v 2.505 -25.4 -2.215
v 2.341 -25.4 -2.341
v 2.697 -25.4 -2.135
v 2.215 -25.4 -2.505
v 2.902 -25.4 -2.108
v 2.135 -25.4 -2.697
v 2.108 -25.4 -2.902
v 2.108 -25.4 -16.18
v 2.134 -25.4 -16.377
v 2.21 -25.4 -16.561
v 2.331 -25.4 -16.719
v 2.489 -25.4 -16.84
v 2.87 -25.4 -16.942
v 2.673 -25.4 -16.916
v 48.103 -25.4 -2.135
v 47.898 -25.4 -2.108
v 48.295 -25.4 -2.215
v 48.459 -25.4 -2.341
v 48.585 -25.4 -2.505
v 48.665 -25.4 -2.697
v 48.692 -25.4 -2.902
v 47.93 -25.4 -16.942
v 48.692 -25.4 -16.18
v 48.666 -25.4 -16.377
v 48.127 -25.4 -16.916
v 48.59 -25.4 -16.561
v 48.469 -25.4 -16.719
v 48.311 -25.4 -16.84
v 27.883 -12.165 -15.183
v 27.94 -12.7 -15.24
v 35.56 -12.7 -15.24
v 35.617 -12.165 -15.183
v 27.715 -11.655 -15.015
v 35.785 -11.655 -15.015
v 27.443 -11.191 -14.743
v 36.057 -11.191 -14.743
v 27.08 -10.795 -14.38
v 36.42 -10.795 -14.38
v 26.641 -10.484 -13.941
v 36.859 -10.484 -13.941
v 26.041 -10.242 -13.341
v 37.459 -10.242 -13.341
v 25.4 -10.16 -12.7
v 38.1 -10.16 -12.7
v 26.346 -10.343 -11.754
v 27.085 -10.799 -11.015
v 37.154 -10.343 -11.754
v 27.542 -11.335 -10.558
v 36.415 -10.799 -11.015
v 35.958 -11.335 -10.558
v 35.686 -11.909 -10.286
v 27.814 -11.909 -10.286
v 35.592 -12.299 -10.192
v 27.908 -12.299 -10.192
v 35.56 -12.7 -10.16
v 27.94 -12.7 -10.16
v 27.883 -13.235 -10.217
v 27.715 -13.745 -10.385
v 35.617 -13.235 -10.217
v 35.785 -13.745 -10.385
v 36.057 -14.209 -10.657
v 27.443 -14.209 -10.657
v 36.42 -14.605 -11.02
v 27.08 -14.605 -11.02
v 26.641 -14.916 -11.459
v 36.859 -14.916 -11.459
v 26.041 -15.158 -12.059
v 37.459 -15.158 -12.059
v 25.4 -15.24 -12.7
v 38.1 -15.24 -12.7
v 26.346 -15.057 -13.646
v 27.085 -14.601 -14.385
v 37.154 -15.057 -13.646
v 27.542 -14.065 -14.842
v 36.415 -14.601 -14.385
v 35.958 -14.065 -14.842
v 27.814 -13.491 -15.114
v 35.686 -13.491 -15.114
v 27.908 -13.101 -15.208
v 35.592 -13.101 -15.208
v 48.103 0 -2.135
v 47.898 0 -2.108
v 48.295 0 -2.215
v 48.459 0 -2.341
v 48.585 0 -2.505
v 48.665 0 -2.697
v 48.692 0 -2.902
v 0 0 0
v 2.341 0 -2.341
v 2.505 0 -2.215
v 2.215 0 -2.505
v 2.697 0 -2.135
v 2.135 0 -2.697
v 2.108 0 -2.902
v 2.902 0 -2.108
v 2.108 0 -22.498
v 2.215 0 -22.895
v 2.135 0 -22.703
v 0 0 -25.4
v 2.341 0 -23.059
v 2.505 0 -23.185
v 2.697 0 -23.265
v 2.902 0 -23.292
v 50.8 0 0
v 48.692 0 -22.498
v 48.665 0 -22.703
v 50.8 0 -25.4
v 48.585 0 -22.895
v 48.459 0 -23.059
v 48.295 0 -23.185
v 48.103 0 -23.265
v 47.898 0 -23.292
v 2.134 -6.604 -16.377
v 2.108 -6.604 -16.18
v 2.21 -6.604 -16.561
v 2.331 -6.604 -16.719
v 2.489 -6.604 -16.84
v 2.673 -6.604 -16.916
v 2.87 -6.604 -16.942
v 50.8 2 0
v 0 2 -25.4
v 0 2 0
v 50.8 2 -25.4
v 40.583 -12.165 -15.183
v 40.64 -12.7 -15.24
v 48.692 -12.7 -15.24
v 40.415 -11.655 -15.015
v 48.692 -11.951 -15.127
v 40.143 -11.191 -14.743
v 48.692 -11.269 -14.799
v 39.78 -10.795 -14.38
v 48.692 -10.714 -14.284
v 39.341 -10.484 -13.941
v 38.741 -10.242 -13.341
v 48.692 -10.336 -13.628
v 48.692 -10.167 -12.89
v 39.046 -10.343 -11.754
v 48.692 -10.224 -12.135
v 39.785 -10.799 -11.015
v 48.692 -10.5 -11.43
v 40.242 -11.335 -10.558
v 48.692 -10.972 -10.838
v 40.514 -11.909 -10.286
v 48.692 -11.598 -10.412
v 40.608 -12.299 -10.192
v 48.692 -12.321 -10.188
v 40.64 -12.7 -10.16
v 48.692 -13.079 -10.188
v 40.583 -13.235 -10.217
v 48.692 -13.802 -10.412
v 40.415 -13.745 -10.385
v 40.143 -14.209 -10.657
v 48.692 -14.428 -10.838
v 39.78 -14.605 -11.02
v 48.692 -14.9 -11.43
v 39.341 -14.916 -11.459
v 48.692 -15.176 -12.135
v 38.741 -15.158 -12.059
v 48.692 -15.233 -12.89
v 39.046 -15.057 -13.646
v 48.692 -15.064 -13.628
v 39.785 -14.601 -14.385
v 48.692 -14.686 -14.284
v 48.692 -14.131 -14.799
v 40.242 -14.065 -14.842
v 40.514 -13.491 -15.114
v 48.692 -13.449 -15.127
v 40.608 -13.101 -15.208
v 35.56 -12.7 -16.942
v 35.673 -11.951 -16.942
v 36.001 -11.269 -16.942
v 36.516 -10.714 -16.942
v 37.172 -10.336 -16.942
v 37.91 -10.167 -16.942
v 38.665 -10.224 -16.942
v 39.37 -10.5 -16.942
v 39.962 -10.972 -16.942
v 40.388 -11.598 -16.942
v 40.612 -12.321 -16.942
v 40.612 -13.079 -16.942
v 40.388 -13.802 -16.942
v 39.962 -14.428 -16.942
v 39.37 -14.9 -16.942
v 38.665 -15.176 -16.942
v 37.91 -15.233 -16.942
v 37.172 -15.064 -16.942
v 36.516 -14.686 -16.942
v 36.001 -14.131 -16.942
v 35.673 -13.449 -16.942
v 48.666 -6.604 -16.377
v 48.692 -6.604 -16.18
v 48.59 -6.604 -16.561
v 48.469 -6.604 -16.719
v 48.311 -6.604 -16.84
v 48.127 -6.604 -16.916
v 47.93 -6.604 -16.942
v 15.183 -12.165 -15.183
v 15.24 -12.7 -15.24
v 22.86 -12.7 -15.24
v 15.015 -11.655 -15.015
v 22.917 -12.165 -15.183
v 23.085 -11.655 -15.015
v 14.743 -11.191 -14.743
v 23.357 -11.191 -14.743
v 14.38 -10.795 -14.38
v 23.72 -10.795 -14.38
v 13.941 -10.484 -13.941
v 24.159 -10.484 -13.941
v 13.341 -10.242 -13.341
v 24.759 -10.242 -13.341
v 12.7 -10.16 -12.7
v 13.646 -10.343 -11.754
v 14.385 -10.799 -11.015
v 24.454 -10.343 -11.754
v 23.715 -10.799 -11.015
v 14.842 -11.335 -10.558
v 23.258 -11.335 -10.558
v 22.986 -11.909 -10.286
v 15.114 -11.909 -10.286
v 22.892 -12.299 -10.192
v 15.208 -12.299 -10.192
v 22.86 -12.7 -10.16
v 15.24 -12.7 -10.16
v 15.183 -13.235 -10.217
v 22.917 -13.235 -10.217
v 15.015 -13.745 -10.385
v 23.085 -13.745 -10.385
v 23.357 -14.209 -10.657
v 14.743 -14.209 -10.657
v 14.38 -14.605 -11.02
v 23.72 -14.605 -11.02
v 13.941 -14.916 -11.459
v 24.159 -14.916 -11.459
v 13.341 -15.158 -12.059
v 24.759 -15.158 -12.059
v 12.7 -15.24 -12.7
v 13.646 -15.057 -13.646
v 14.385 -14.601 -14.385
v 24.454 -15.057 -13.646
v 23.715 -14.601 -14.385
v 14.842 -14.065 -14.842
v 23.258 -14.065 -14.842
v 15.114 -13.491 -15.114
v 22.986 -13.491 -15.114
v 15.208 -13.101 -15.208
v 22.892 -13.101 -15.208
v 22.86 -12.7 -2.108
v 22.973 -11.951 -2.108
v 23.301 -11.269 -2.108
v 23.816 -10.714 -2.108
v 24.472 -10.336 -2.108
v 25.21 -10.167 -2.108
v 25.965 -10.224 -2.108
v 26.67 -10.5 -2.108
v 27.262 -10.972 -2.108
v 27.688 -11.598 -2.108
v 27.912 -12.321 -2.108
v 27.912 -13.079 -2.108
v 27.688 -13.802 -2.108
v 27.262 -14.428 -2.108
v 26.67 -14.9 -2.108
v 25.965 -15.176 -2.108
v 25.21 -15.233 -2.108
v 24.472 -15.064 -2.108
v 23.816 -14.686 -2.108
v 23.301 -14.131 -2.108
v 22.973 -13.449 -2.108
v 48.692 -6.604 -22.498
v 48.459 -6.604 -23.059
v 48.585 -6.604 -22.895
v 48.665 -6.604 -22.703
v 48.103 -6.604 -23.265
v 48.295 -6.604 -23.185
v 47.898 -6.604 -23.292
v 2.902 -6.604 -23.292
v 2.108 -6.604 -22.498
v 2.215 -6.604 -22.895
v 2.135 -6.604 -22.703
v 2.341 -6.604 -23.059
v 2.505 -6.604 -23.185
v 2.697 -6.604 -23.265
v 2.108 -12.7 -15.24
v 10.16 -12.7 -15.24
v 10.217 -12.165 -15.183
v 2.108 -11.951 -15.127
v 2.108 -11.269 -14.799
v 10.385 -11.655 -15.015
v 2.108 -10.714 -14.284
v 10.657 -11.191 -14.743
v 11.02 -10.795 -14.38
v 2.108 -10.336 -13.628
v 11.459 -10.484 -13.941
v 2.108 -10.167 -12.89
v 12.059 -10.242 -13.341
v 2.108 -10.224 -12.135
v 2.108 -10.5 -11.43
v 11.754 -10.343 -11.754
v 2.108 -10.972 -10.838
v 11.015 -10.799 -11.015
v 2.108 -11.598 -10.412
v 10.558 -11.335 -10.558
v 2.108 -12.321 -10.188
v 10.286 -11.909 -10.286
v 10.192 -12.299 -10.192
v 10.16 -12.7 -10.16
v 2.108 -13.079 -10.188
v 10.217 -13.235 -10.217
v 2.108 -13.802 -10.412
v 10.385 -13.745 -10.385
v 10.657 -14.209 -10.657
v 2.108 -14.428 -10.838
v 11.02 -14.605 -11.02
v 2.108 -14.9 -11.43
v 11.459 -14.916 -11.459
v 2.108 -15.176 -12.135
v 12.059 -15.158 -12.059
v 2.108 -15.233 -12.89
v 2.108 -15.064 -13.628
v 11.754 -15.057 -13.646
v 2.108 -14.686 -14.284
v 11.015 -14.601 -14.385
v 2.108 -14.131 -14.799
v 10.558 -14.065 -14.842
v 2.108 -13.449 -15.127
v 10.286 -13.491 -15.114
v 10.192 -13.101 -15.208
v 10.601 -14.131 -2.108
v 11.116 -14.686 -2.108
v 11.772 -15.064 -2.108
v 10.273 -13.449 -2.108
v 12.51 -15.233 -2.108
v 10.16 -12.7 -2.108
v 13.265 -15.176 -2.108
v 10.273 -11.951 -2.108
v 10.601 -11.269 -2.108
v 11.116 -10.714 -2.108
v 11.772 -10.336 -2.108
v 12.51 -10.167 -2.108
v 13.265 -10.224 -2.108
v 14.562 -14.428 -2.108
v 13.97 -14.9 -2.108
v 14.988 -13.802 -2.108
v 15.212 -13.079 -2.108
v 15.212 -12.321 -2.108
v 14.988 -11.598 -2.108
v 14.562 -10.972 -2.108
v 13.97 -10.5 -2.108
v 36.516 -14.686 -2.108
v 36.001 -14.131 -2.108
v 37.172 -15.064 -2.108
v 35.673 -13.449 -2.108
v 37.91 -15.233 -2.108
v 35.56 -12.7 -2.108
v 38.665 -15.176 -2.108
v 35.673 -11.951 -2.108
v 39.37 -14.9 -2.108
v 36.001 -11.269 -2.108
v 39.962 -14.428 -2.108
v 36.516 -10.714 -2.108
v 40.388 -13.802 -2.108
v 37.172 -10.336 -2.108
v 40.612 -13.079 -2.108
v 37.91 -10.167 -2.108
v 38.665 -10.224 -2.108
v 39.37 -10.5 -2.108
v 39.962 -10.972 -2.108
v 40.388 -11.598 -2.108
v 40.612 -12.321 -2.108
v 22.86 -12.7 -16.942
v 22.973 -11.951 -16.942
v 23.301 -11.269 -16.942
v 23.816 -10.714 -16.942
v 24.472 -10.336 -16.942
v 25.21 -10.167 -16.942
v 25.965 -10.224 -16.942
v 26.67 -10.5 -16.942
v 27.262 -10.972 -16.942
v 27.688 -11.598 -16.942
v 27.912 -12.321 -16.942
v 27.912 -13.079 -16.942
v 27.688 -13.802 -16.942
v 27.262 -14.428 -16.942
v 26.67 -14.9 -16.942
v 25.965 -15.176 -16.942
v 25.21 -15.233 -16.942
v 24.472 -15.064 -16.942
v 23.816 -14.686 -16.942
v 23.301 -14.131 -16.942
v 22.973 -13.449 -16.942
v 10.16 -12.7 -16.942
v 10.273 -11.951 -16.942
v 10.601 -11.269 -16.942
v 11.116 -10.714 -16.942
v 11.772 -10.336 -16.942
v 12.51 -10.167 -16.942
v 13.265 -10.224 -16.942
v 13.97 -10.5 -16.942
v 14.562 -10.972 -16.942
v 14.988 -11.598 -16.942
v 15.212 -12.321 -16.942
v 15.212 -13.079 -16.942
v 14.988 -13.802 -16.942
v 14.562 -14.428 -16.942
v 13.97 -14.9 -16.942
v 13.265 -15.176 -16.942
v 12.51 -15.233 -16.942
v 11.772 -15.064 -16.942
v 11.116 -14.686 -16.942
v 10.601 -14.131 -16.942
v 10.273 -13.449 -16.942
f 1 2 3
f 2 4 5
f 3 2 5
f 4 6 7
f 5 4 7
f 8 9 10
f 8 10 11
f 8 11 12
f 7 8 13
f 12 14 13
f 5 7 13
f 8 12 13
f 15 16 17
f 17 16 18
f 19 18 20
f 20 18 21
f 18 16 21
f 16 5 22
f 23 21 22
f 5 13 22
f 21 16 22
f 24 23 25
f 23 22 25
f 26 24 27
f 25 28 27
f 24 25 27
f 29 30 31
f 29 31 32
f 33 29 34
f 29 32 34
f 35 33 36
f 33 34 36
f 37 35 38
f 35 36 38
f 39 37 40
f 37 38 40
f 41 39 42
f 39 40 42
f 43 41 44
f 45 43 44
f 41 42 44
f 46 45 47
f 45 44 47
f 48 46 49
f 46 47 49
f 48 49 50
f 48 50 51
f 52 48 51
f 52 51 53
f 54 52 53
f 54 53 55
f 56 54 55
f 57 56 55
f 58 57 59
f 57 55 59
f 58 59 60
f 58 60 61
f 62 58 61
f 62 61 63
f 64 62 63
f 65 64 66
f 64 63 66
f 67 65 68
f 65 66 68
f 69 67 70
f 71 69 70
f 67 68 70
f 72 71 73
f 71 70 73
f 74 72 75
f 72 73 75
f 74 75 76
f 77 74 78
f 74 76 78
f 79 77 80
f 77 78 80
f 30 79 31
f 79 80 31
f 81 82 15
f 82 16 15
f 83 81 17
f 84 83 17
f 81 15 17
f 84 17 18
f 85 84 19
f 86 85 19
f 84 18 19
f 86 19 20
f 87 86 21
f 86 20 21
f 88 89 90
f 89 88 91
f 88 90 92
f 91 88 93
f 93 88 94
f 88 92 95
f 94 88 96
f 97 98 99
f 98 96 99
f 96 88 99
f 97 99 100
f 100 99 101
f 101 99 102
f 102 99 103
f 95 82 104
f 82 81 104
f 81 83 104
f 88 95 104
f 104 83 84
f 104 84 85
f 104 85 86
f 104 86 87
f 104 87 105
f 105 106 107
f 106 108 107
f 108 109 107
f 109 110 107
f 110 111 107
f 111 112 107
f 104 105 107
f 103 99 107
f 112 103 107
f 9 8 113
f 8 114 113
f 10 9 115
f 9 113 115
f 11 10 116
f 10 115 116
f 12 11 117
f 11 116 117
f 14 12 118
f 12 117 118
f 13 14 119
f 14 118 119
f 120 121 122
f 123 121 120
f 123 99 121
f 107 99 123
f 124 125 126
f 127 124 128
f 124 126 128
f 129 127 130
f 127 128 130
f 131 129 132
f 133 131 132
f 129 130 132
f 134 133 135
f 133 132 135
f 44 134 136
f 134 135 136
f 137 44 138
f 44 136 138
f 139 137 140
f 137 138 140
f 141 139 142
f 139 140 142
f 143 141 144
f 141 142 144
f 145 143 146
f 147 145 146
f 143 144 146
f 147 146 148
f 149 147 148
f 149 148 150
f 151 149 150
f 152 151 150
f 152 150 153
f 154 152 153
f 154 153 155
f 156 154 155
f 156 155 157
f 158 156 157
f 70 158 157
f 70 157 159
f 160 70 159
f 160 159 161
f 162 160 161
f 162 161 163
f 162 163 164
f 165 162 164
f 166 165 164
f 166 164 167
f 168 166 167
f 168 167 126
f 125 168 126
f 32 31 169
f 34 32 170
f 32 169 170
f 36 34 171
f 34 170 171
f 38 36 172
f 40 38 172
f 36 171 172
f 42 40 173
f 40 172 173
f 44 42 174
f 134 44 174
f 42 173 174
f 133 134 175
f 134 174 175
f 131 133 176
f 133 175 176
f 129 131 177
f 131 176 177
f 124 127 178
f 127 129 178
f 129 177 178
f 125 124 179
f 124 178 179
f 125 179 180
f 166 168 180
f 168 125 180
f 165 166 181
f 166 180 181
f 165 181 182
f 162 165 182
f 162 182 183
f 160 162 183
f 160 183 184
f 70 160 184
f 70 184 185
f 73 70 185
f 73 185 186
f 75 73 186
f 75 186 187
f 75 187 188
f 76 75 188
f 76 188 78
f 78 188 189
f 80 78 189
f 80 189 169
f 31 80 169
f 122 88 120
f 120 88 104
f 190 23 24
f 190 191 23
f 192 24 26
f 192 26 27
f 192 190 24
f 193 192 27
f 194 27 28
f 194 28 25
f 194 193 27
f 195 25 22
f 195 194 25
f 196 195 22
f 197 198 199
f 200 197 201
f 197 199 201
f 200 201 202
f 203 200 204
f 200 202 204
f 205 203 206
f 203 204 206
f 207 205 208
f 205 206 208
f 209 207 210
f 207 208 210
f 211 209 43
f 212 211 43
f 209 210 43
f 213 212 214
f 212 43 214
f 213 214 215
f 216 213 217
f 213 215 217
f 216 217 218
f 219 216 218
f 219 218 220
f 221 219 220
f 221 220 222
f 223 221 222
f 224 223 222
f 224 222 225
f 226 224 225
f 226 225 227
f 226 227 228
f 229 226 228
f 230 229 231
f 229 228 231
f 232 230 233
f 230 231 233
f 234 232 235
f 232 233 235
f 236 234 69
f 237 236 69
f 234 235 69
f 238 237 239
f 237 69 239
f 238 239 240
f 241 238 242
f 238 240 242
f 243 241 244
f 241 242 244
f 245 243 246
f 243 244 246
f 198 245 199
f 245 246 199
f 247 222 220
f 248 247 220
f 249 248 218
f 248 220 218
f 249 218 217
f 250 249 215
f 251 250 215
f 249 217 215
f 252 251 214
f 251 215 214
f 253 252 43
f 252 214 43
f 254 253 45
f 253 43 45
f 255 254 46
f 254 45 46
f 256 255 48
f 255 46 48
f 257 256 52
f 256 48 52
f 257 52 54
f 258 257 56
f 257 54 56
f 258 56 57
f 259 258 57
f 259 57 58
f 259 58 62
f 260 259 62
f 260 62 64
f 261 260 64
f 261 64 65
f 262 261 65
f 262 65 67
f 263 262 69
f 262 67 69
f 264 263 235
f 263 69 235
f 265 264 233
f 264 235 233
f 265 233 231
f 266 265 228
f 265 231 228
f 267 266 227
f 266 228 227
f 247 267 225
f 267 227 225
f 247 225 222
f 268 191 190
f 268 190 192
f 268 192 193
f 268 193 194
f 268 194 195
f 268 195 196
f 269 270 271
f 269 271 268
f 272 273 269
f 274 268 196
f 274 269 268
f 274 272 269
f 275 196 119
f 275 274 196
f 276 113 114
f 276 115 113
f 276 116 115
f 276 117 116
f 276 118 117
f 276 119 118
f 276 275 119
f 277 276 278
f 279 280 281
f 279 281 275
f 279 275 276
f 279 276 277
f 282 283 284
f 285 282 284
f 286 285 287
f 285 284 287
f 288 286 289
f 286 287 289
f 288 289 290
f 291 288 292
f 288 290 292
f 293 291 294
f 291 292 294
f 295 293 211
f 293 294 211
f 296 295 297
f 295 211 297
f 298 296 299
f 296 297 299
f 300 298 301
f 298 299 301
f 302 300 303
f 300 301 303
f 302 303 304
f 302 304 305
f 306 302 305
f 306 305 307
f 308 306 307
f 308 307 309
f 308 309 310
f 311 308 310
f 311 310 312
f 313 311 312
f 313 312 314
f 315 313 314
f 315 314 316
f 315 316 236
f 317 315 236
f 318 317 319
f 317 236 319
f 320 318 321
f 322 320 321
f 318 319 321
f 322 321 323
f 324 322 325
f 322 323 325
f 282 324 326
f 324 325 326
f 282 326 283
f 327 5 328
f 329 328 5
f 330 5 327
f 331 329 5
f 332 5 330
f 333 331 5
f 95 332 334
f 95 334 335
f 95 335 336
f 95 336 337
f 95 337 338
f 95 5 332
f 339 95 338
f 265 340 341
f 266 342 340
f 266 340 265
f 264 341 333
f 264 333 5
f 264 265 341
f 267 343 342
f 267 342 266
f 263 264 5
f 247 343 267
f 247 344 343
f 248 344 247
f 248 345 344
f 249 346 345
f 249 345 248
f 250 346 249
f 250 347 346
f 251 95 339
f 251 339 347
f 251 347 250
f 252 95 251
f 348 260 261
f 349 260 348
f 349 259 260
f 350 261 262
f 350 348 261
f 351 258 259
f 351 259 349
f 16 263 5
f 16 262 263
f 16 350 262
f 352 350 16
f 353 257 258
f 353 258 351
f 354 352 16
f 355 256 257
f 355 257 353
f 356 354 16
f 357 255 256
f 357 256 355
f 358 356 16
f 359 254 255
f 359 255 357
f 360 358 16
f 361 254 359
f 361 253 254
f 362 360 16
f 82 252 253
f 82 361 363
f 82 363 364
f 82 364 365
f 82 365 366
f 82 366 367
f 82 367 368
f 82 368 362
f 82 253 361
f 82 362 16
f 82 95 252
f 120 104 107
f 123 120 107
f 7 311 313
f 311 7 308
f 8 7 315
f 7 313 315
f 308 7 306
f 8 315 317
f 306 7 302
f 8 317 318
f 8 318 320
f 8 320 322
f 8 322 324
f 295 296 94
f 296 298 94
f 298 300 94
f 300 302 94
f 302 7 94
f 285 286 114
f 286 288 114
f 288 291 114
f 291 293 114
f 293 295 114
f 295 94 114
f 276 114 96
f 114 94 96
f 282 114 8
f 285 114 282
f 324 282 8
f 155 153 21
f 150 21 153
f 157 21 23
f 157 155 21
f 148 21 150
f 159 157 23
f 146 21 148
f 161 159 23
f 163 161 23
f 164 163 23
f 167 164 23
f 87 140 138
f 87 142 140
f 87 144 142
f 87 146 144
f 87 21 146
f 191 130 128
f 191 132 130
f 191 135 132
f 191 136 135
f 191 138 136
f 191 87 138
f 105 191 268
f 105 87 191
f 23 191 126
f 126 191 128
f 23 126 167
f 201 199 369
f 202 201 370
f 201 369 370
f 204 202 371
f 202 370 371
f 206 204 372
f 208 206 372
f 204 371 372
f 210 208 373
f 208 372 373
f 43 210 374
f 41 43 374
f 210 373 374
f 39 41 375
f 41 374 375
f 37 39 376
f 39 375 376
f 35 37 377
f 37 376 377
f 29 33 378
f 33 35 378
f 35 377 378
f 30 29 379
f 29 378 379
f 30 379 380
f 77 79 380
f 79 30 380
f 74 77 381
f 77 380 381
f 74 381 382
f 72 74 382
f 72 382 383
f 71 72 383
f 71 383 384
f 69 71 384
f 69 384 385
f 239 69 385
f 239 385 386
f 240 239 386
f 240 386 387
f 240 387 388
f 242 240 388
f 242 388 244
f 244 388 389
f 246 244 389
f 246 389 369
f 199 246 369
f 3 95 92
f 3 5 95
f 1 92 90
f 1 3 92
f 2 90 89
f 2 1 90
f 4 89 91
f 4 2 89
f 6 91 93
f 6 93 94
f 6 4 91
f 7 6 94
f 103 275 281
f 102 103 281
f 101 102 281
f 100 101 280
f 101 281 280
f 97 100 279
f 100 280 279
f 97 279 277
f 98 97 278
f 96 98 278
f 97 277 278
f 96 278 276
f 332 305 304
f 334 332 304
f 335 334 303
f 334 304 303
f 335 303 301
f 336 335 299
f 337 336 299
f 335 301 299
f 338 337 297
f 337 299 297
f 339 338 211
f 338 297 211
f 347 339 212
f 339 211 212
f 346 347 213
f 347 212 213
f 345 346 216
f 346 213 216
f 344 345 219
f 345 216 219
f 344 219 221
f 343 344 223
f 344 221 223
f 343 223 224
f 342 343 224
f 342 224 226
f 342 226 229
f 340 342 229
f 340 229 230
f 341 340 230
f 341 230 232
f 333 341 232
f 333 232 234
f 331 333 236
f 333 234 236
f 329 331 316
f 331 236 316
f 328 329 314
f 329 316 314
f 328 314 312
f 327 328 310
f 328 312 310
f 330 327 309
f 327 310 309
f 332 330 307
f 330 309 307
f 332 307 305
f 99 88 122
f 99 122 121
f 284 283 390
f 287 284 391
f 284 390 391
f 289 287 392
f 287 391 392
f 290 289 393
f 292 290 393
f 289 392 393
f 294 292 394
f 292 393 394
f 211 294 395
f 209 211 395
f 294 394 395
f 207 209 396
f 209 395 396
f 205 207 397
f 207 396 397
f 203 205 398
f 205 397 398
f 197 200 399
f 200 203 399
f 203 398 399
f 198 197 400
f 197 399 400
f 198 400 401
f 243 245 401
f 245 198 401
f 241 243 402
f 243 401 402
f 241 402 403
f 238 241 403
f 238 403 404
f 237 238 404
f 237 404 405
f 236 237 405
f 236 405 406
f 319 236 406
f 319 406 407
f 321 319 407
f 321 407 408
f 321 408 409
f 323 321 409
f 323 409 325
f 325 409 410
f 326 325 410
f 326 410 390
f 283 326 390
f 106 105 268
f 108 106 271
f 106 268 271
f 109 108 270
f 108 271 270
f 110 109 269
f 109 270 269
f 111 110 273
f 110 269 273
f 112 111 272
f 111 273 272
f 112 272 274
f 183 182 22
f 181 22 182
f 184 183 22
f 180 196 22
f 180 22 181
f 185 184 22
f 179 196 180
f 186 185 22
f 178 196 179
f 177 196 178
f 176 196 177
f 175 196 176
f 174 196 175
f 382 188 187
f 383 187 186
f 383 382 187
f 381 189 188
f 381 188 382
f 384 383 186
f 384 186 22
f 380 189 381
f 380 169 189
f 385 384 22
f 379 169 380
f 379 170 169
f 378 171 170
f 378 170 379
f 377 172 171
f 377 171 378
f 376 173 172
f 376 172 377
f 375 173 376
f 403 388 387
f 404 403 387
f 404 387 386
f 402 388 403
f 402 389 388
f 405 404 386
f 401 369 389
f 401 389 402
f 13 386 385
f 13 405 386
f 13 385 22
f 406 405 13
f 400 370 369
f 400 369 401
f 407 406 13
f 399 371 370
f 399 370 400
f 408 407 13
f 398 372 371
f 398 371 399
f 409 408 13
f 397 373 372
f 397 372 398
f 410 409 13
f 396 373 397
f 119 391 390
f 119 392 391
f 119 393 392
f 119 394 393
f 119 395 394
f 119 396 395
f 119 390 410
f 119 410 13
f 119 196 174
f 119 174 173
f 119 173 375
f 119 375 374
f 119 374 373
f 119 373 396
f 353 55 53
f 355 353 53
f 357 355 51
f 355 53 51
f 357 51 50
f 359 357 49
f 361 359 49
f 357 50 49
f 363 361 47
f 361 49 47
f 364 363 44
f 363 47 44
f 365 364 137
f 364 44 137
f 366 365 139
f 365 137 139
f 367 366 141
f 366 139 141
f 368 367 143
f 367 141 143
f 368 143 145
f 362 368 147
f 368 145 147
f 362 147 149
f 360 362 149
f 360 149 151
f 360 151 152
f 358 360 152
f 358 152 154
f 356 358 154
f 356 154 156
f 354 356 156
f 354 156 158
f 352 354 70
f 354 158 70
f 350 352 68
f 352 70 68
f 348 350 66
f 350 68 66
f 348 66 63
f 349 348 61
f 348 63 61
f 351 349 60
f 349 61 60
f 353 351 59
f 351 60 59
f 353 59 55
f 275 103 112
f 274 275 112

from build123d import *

# Parameters (mm, degrees)
SKETCH2_W           = 50.8
SKETCH2_H           = 25.4
BOSS_EXTRUDE2_DEPTH = 1.999996
SKETCH2_4_W         = 46.5836
SKETCH2_4_H         = 21.1836
BOSS_EXTRUDE3_DEPTH = 25.4
FILLET3_R           = 0.79375
SKETCH3_R           = 2.54
CUT_EXTRUDE1_DEPTH  = 49.6918
SKETCH4_R           = 2.54
CUT_EXTRUDE2_DEPTH  = 24.2918
SKETCH5_W           = 46.5836
SKETCH5_H           = 18.796
CUT_EXTRUDE3_DEPTH  = 6.35
FILLET4_R           = 0.762


with BuildPart() as part:
    # Sketch2 → Boss-Extrude2 (new body)
    with BuildSketch(Plane(origin=(0, 0, 0), x_dir=(1, 0, 0), z_dir=(0, 1, 0))):
        with Locations((25.4, 12.7)):
            Rectangle(SKETCH2_W, SKETCH2_H)
    extrude(amount=BOSS_EXTRUDE2_DEPTH)

    # Sketch2<4> → Boss-Extrude3 (add)
    with BuildSketch(Plane(origin=(0, 0, 0), x_dir=(1, 0, 0), z_dir=(0, 1, 0))):
        with Locations((25.4, 12.7)):
            Rectangle(SKETCH2_4_W, SKETCH2_4_H)
    extrude(amount=-BOSS_EXTRUDE3_DEPTH)

    # Fillet3
    fillet3_edges = [part.edges().sort_by_distance(p)[0] for p in [
        (2.1082, -12.7, -2.1082),
        (2.1082, -12.7, -23.2918),
        (48.6918, -12.7, -23.2918),
        (48.6918, -12.7, -2.1082),
    ]]
    fillet(fillet3_edges, radius=FILLET3_R)

    # Sketch3 → Cut-Extrude1 (cut, through all)
    with BuildSketch(Plane(origin=(48.6918, 0, 0), x_dir=(0, 0, -1), z_dir=(1, 0, 0))):
        with Locations((12.7, -12.7)):
            Circle(SKETCH3_R)
    extrude(amount=-CUT_EXTRUDE1_DEPTH, mode=Mode.SUBTRACT)

    # Sketch4 → Cut-Extrude2 (cut, through all)
    with BuildSketch(Plane(origin=(0, 0, -23.2918), x_dir=(-1, 0, 0), z_dir=(0, 0, -1))):
        with Locations((-25.4, -12.7)):
            Circle(SKETCH4_R)
        with Locations((-38.1, -12.7)):
            Circle(SKETCH4_R)
        with Locations((-12.7, -12.7)):
            Circle(SKETCH4_R)
    extrude(amount=-CUT_EXTRUDE2_DEPTH, mode=Mode.SUBTRACT)

    # Sketch5 → Cut-Extrude3 (cut)
    with BuildSketch(Plane(origin=(0, 0, -23.2918), x_dir=(-1, 0, 0), z_dir=(0, 0, -1))):
        with Locations((-25.4, -16.002)):
            Rectangle(SKETCH5_W, SKETCH5_H)
    extrude(amount=-CUT_EXTRUDE3_DEPTH, mode=Mode.SUBTRACT)

    # Fillet4
    fillet4_edges = [part.edges().sort_by_distance(p)[0] for p in [
        (2.1082, -16.002, -16.9418),
        (48.6918, -16.002, -16.9418),
    ]]
    fillet(fillet4_edges, radius=FILLET4_R)


solid = part.part
